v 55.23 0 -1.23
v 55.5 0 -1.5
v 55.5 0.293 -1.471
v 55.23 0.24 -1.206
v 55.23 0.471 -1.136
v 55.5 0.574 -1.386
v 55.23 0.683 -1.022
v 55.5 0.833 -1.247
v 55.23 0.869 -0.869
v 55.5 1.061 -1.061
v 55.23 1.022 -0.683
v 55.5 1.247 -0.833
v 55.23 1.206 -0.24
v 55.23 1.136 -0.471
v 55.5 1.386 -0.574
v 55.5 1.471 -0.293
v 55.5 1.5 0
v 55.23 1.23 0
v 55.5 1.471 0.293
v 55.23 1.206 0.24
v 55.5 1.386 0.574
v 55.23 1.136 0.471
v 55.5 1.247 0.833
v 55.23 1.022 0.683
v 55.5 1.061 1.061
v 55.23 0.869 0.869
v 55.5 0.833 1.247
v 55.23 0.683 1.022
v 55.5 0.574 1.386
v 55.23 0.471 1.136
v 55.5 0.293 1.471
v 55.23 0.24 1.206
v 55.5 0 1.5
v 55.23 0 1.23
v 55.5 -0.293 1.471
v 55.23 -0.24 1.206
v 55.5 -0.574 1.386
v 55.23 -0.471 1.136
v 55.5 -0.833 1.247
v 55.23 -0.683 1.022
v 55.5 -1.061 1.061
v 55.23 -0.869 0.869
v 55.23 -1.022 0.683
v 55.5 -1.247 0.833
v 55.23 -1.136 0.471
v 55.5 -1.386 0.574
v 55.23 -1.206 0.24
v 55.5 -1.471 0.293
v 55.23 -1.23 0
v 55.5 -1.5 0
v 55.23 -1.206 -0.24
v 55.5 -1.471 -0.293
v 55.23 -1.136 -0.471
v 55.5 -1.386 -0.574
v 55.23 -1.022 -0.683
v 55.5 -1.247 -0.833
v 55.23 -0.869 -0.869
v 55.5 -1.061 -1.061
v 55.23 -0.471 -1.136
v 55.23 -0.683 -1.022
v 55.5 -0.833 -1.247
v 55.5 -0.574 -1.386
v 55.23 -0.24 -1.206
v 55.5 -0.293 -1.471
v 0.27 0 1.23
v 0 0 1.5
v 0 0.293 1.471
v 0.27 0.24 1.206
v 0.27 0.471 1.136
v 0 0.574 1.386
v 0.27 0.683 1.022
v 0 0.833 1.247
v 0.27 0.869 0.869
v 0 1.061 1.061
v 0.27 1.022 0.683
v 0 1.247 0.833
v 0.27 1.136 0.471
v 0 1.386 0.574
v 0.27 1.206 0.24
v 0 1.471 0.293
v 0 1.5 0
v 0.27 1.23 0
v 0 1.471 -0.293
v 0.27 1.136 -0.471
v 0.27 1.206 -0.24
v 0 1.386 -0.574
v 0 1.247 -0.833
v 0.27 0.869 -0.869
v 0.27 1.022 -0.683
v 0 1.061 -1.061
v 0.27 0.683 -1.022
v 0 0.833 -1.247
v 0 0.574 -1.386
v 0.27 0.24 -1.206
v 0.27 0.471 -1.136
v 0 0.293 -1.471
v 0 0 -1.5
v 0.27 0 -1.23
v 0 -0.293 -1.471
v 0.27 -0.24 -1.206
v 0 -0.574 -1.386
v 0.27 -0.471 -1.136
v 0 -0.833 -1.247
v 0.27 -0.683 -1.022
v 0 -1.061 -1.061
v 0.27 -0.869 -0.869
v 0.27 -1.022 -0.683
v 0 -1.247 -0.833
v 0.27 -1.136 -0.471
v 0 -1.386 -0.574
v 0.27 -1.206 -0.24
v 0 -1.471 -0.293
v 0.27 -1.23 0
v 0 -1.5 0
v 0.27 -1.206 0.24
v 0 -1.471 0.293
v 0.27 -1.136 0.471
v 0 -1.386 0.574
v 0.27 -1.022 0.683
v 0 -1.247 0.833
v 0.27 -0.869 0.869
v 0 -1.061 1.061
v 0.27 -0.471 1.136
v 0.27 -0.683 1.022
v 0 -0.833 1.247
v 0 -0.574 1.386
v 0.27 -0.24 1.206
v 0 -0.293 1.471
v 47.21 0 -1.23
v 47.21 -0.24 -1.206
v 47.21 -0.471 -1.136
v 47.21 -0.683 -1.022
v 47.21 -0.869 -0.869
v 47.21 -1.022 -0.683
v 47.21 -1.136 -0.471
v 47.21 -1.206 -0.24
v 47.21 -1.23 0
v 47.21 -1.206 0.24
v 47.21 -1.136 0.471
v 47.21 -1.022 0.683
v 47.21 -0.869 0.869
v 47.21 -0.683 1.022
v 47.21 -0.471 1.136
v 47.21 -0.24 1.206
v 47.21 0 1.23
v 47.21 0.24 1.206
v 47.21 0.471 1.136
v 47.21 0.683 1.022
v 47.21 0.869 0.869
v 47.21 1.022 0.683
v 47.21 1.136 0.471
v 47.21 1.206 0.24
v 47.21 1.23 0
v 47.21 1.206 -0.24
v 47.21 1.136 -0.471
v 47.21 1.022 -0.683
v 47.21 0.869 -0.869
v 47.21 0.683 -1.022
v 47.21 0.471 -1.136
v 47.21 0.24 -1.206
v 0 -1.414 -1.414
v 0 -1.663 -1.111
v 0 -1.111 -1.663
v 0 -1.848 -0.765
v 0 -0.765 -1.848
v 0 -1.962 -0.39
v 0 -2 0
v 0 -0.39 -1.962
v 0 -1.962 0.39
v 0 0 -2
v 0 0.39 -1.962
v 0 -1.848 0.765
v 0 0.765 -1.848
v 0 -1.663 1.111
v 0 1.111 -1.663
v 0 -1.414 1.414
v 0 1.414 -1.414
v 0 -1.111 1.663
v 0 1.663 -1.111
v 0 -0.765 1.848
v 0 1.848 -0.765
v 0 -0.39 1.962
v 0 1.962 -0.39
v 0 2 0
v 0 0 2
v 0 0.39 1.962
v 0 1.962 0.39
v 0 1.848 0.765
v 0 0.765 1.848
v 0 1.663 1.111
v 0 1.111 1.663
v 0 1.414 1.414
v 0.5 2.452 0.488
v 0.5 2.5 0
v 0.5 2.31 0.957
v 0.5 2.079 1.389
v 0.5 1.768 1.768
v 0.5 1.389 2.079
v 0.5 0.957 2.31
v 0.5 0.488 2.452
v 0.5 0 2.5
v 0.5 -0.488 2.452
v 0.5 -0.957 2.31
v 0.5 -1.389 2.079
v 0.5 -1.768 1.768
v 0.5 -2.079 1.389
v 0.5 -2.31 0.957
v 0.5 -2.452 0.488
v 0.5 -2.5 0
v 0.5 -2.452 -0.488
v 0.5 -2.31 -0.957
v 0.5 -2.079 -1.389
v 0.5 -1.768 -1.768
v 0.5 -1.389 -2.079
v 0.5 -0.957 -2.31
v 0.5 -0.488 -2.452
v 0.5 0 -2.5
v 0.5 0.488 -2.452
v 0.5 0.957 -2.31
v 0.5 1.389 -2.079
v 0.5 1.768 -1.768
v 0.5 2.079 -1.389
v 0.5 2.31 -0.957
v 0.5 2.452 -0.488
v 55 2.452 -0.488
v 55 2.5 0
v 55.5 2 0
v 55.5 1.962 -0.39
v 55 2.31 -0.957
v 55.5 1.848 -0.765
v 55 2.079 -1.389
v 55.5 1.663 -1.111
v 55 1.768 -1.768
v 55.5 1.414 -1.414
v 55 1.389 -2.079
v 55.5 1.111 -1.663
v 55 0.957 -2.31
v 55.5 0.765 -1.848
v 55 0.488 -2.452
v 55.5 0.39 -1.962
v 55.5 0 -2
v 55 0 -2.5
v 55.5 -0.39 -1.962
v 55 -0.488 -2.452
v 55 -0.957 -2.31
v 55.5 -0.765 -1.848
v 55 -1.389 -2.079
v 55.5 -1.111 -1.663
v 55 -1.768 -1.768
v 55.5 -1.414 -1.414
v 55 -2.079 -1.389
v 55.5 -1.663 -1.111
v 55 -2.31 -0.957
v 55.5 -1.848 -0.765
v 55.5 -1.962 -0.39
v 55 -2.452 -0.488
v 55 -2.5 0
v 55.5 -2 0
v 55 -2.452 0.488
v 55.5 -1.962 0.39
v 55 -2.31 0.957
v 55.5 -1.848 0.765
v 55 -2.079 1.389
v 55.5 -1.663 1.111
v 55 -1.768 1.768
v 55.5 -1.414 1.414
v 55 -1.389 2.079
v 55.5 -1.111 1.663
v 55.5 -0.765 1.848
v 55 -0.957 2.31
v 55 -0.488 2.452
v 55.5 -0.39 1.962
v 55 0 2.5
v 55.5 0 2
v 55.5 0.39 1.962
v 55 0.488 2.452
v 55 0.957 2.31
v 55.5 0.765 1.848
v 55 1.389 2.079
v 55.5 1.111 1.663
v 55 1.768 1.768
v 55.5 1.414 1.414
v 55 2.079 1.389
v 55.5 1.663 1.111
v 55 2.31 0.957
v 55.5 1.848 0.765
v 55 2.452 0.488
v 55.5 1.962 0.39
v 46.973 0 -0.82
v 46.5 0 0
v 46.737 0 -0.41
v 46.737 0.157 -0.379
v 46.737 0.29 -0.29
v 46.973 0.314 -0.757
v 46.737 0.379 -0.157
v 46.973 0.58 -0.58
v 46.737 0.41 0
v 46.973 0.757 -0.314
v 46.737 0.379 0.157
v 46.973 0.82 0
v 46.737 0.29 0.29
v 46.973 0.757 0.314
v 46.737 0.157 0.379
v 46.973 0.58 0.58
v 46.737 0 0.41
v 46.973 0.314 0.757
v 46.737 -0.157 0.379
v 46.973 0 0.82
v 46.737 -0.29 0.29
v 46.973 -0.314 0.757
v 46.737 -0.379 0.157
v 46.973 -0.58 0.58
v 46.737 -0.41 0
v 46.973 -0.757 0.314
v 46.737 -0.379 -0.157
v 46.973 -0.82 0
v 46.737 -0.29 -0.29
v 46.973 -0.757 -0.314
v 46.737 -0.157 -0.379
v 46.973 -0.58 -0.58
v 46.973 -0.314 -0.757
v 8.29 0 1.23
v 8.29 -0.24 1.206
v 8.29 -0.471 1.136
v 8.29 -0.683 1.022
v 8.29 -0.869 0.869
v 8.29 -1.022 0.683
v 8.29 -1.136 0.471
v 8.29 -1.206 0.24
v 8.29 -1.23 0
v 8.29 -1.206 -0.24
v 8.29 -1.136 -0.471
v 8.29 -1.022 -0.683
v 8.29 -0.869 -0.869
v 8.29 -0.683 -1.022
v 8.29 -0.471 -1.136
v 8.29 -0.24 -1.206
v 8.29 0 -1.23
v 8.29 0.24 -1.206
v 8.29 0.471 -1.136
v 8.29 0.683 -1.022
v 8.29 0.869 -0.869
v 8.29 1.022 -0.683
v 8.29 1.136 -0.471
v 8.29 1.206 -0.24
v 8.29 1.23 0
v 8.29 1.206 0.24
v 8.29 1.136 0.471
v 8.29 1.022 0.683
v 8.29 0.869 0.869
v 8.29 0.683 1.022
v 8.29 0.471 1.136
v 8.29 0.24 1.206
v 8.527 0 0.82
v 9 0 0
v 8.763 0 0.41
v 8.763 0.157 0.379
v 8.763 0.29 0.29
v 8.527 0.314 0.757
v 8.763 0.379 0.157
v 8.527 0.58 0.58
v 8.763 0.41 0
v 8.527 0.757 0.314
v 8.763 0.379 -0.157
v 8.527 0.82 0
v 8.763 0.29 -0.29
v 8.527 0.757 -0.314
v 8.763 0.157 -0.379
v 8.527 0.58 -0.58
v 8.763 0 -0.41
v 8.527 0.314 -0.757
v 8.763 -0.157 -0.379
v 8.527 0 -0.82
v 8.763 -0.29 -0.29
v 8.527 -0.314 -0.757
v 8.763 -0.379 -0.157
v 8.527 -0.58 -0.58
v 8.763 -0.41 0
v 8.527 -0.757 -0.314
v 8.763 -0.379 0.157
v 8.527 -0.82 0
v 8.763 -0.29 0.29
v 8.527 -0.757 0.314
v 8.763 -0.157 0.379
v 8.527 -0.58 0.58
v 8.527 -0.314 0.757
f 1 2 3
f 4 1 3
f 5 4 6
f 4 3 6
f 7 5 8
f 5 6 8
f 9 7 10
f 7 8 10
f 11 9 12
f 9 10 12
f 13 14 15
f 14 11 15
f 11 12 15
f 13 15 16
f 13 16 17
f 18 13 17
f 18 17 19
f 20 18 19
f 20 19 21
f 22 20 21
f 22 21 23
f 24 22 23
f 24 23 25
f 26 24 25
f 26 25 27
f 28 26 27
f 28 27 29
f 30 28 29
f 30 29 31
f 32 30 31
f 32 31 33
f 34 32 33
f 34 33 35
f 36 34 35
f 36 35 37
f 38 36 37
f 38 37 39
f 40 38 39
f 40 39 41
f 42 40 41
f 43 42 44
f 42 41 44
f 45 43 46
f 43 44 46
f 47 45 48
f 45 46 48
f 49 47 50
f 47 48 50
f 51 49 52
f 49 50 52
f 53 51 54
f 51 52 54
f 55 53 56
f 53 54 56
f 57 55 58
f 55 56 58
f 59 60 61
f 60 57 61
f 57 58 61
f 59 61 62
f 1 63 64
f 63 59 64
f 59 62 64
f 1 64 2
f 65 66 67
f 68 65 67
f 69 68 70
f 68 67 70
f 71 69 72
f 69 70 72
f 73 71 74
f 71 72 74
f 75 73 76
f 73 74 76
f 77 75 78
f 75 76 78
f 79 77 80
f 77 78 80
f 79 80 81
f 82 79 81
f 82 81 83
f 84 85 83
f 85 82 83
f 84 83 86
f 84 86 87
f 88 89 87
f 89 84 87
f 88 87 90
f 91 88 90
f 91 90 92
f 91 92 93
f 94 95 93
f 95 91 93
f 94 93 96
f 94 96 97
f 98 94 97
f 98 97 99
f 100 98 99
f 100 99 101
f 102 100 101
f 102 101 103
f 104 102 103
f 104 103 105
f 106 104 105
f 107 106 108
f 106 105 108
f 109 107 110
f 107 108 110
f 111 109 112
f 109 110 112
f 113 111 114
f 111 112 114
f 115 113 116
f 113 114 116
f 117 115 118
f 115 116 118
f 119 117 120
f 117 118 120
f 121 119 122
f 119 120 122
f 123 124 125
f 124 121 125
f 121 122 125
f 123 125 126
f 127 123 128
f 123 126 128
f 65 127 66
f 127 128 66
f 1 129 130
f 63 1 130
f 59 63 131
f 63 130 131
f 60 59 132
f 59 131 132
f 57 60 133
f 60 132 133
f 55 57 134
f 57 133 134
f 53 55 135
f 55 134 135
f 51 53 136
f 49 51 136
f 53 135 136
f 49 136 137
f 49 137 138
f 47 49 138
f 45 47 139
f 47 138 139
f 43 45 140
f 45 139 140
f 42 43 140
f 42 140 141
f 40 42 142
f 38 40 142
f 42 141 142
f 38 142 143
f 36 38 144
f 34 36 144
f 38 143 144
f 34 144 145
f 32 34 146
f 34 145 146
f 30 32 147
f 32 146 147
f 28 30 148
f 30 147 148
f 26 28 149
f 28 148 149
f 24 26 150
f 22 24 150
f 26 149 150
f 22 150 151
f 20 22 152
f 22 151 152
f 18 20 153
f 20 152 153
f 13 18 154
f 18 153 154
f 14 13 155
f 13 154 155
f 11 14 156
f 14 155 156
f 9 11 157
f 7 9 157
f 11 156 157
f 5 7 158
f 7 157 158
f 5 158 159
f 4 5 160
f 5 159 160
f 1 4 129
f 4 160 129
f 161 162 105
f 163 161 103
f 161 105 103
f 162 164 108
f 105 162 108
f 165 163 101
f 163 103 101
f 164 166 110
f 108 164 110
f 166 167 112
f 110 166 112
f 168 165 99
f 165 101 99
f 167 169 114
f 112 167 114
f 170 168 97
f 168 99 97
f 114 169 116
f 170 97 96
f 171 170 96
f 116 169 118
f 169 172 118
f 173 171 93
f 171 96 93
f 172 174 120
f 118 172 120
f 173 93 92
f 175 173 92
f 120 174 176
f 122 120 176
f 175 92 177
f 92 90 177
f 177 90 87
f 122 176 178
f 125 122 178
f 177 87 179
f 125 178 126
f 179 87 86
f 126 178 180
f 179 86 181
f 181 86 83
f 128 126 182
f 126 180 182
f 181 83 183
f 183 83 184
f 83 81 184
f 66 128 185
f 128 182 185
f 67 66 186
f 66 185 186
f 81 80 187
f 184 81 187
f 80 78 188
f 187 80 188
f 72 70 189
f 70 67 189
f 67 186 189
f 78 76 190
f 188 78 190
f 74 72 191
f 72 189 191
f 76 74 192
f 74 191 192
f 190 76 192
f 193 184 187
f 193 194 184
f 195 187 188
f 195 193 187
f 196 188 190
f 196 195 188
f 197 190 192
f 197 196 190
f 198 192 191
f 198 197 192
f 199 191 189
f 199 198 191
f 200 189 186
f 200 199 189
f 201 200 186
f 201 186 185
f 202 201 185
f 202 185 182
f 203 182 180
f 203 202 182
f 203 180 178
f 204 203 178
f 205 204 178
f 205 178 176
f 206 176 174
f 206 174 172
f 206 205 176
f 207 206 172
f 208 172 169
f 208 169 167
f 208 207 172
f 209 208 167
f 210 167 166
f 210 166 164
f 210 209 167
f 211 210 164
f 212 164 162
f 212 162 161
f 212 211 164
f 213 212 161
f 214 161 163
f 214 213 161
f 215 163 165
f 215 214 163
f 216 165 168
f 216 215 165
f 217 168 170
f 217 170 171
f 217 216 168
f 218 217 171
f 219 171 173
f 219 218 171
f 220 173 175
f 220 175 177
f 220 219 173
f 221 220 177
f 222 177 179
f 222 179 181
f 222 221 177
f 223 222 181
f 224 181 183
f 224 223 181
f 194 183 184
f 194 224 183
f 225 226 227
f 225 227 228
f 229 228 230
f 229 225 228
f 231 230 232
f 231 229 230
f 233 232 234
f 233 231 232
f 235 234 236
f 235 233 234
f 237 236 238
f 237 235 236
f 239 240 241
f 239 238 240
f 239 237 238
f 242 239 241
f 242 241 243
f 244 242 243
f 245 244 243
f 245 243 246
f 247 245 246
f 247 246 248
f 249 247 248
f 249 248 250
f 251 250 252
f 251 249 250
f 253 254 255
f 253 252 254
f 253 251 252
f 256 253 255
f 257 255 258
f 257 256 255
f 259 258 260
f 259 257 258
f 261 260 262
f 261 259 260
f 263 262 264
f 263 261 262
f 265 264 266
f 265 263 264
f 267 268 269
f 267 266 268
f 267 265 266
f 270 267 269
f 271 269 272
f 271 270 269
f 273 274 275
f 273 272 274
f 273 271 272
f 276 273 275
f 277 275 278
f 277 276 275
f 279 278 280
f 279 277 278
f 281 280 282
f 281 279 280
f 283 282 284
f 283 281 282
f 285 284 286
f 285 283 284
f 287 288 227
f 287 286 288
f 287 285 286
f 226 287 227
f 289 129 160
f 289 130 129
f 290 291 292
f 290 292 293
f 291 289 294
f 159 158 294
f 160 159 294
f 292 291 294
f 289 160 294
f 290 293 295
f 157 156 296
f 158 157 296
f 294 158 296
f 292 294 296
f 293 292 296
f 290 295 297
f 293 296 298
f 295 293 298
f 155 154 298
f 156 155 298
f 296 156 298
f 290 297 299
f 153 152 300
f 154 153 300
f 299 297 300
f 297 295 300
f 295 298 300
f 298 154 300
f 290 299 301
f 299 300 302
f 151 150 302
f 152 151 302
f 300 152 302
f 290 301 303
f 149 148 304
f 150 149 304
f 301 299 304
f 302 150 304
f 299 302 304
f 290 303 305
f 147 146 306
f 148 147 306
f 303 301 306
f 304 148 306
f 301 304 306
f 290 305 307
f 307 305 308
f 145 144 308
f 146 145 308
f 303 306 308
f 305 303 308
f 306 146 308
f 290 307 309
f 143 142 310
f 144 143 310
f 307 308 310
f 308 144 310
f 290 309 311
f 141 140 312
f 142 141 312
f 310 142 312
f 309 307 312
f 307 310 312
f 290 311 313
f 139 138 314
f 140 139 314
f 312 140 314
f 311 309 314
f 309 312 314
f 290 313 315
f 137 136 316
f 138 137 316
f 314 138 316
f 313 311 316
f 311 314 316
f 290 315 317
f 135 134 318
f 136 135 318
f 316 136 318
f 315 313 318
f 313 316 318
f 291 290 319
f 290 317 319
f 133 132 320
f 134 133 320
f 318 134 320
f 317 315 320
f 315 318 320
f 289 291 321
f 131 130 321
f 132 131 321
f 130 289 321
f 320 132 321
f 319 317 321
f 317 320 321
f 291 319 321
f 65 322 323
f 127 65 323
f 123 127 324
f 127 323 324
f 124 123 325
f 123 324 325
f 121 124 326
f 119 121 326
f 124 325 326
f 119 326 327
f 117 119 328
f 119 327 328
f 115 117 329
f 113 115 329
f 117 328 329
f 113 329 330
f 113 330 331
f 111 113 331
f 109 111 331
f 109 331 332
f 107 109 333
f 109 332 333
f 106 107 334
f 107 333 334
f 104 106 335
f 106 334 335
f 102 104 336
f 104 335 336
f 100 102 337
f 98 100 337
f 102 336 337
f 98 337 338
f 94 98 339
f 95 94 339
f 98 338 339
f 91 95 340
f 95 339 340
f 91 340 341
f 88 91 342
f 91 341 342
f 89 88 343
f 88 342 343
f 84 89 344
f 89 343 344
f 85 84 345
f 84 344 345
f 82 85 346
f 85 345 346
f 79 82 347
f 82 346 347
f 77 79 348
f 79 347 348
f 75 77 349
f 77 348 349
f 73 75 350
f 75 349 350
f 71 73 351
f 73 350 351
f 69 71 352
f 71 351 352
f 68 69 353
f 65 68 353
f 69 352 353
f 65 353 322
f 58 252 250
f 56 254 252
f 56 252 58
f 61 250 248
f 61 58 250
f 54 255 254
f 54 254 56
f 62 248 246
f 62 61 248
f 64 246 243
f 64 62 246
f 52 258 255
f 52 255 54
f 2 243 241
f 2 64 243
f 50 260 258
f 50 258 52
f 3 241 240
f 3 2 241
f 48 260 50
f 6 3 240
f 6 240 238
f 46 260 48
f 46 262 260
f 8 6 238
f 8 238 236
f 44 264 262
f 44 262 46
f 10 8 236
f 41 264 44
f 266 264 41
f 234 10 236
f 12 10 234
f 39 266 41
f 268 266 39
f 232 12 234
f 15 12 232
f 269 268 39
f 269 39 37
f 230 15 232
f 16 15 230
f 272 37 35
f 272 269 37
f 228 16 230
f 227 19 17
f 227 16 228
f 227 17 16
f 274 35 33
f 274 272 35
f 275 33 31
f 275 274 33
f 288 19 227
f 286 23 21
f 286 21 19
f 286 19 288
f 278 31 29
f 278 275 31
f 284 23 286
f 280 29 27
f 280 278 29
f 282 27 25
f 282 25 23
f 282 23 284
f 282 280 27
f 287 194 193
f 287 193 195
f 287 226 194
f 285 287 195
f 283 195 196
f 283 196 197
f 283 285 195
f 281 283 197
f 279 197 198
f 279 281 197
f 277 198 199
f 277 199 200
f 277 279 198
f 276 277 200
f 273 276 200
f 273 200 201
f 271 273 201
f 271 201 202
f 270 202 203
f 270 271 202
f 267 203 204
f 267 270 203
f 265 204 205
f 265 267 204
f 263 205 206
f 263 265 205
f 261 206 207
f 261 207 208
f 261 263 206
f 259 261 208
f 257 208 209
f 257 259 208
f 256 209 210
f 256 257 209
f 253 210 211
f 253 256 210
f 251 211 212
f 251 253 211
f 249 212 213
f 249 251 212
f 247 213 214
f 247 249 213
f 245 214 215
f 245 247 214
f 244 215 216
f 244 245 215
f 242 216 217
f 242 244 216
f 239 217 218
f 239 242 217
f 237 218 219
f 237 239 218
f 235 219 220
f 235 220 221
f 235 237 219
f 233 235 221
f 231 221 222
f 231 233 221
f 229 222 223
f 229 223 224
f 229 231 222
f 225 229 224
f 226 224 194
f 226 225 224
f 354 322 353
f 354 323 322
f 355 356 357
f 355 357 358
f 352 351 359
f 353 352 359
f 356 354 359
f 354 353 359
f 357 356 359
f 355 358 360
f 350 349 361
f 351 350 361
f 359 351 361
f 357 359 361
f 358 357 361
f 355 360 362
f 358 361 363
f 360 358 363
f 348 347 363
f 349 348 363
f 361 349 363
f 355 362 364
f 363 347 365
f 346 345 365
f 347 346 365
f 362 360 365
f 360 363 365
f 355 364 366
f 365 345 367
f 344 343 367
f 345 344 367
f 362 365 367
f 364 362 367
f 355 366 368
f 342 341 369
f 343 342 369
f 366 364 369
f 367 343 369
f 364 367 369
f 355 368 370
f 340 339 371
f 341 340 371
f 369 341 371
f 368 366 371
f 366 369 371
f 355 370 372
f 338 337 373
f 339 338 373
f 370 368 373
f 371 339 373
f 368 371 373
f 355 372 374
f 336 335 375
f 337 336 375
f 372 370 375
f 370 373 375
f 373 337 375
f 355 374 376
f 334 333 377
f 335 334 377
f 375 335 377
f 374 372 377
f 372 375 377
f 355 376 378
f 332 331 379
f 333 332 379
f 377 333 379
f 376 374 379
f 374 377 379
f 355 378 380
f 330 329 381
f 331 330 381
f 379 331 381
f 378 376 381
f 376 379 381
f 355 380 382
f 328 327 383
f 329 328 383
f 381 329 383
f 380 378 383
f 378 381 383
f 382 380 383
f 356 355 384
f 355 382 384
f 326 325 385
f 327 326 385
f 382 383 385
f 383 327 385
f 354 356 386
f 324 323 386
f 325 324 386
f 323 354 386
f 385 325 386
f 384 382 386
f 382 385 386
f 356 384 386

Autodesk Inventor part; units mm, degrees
ref_plane "YZ Plane" through (0, 0, 0) normal (1, 0, 0) x (0, 1, 0)
ref_plane "XZ Plane" through (0, 0, 0) normal (0, 1, 0) x (-1, 0, 0)
ref_plane "XY Plane" through (0, 0, 0) normal (0, 0, 1) x (1, 0, 0)
sketch "Sketch_1" plane through (0, 0, 0) normal (0, 0, 1) x (1, 0, 0)
  line L0 (55.5, 0) -> (0, 0)
  line L1 (0, 0) -> (0, 2)
  line L2 (0, 2) -> (0.5, 2.5)
  line L3 (0.5, 2.5) -> (55, 2.5)
  line L4 (55, 2.5) -> (55.5, 2)
  line L5 (55.5, 2) -> (55.5, 0)
  line L6 (55.5, 0) -> (0, 0)
revolve "Revolution1" add sketch "Sketch_1" angle 360 about axis through (55.5, 0, 0) along (1, 0, 0)
sketch "Sketch2" plane through (0, 0, 0) normal (-1, 0, 0) x (0, 0, 1)
  point P0 (0, 0)
hole "Hole1" at (0, 0, 0) direction (1, 0, 0) diameter 2.459 depth 8.2901 tip angle 120 countersink diameter 3 countersink angle 90 thread size "M3x0.5" class "6H" standard "ISO Metric profile"
sketch "Sketch3" plane through (55.5, 0, 0) normal (1, 0, 0) x (0, 0, -1)
  point P0 (0, 0)
hole "Hole2" at (55.5, 0, 0) direction (-1, 0, 0) diameter 2.459 depth 8.2901 tip angle 120 countersink diameter 3 countersink angle 90 thread size "M3x0.5" class "6H" standard "ISO Metric profile"
properties part number "SETF5-55.5-M3-N3" material "ステンレス鋼 AISI 304"
